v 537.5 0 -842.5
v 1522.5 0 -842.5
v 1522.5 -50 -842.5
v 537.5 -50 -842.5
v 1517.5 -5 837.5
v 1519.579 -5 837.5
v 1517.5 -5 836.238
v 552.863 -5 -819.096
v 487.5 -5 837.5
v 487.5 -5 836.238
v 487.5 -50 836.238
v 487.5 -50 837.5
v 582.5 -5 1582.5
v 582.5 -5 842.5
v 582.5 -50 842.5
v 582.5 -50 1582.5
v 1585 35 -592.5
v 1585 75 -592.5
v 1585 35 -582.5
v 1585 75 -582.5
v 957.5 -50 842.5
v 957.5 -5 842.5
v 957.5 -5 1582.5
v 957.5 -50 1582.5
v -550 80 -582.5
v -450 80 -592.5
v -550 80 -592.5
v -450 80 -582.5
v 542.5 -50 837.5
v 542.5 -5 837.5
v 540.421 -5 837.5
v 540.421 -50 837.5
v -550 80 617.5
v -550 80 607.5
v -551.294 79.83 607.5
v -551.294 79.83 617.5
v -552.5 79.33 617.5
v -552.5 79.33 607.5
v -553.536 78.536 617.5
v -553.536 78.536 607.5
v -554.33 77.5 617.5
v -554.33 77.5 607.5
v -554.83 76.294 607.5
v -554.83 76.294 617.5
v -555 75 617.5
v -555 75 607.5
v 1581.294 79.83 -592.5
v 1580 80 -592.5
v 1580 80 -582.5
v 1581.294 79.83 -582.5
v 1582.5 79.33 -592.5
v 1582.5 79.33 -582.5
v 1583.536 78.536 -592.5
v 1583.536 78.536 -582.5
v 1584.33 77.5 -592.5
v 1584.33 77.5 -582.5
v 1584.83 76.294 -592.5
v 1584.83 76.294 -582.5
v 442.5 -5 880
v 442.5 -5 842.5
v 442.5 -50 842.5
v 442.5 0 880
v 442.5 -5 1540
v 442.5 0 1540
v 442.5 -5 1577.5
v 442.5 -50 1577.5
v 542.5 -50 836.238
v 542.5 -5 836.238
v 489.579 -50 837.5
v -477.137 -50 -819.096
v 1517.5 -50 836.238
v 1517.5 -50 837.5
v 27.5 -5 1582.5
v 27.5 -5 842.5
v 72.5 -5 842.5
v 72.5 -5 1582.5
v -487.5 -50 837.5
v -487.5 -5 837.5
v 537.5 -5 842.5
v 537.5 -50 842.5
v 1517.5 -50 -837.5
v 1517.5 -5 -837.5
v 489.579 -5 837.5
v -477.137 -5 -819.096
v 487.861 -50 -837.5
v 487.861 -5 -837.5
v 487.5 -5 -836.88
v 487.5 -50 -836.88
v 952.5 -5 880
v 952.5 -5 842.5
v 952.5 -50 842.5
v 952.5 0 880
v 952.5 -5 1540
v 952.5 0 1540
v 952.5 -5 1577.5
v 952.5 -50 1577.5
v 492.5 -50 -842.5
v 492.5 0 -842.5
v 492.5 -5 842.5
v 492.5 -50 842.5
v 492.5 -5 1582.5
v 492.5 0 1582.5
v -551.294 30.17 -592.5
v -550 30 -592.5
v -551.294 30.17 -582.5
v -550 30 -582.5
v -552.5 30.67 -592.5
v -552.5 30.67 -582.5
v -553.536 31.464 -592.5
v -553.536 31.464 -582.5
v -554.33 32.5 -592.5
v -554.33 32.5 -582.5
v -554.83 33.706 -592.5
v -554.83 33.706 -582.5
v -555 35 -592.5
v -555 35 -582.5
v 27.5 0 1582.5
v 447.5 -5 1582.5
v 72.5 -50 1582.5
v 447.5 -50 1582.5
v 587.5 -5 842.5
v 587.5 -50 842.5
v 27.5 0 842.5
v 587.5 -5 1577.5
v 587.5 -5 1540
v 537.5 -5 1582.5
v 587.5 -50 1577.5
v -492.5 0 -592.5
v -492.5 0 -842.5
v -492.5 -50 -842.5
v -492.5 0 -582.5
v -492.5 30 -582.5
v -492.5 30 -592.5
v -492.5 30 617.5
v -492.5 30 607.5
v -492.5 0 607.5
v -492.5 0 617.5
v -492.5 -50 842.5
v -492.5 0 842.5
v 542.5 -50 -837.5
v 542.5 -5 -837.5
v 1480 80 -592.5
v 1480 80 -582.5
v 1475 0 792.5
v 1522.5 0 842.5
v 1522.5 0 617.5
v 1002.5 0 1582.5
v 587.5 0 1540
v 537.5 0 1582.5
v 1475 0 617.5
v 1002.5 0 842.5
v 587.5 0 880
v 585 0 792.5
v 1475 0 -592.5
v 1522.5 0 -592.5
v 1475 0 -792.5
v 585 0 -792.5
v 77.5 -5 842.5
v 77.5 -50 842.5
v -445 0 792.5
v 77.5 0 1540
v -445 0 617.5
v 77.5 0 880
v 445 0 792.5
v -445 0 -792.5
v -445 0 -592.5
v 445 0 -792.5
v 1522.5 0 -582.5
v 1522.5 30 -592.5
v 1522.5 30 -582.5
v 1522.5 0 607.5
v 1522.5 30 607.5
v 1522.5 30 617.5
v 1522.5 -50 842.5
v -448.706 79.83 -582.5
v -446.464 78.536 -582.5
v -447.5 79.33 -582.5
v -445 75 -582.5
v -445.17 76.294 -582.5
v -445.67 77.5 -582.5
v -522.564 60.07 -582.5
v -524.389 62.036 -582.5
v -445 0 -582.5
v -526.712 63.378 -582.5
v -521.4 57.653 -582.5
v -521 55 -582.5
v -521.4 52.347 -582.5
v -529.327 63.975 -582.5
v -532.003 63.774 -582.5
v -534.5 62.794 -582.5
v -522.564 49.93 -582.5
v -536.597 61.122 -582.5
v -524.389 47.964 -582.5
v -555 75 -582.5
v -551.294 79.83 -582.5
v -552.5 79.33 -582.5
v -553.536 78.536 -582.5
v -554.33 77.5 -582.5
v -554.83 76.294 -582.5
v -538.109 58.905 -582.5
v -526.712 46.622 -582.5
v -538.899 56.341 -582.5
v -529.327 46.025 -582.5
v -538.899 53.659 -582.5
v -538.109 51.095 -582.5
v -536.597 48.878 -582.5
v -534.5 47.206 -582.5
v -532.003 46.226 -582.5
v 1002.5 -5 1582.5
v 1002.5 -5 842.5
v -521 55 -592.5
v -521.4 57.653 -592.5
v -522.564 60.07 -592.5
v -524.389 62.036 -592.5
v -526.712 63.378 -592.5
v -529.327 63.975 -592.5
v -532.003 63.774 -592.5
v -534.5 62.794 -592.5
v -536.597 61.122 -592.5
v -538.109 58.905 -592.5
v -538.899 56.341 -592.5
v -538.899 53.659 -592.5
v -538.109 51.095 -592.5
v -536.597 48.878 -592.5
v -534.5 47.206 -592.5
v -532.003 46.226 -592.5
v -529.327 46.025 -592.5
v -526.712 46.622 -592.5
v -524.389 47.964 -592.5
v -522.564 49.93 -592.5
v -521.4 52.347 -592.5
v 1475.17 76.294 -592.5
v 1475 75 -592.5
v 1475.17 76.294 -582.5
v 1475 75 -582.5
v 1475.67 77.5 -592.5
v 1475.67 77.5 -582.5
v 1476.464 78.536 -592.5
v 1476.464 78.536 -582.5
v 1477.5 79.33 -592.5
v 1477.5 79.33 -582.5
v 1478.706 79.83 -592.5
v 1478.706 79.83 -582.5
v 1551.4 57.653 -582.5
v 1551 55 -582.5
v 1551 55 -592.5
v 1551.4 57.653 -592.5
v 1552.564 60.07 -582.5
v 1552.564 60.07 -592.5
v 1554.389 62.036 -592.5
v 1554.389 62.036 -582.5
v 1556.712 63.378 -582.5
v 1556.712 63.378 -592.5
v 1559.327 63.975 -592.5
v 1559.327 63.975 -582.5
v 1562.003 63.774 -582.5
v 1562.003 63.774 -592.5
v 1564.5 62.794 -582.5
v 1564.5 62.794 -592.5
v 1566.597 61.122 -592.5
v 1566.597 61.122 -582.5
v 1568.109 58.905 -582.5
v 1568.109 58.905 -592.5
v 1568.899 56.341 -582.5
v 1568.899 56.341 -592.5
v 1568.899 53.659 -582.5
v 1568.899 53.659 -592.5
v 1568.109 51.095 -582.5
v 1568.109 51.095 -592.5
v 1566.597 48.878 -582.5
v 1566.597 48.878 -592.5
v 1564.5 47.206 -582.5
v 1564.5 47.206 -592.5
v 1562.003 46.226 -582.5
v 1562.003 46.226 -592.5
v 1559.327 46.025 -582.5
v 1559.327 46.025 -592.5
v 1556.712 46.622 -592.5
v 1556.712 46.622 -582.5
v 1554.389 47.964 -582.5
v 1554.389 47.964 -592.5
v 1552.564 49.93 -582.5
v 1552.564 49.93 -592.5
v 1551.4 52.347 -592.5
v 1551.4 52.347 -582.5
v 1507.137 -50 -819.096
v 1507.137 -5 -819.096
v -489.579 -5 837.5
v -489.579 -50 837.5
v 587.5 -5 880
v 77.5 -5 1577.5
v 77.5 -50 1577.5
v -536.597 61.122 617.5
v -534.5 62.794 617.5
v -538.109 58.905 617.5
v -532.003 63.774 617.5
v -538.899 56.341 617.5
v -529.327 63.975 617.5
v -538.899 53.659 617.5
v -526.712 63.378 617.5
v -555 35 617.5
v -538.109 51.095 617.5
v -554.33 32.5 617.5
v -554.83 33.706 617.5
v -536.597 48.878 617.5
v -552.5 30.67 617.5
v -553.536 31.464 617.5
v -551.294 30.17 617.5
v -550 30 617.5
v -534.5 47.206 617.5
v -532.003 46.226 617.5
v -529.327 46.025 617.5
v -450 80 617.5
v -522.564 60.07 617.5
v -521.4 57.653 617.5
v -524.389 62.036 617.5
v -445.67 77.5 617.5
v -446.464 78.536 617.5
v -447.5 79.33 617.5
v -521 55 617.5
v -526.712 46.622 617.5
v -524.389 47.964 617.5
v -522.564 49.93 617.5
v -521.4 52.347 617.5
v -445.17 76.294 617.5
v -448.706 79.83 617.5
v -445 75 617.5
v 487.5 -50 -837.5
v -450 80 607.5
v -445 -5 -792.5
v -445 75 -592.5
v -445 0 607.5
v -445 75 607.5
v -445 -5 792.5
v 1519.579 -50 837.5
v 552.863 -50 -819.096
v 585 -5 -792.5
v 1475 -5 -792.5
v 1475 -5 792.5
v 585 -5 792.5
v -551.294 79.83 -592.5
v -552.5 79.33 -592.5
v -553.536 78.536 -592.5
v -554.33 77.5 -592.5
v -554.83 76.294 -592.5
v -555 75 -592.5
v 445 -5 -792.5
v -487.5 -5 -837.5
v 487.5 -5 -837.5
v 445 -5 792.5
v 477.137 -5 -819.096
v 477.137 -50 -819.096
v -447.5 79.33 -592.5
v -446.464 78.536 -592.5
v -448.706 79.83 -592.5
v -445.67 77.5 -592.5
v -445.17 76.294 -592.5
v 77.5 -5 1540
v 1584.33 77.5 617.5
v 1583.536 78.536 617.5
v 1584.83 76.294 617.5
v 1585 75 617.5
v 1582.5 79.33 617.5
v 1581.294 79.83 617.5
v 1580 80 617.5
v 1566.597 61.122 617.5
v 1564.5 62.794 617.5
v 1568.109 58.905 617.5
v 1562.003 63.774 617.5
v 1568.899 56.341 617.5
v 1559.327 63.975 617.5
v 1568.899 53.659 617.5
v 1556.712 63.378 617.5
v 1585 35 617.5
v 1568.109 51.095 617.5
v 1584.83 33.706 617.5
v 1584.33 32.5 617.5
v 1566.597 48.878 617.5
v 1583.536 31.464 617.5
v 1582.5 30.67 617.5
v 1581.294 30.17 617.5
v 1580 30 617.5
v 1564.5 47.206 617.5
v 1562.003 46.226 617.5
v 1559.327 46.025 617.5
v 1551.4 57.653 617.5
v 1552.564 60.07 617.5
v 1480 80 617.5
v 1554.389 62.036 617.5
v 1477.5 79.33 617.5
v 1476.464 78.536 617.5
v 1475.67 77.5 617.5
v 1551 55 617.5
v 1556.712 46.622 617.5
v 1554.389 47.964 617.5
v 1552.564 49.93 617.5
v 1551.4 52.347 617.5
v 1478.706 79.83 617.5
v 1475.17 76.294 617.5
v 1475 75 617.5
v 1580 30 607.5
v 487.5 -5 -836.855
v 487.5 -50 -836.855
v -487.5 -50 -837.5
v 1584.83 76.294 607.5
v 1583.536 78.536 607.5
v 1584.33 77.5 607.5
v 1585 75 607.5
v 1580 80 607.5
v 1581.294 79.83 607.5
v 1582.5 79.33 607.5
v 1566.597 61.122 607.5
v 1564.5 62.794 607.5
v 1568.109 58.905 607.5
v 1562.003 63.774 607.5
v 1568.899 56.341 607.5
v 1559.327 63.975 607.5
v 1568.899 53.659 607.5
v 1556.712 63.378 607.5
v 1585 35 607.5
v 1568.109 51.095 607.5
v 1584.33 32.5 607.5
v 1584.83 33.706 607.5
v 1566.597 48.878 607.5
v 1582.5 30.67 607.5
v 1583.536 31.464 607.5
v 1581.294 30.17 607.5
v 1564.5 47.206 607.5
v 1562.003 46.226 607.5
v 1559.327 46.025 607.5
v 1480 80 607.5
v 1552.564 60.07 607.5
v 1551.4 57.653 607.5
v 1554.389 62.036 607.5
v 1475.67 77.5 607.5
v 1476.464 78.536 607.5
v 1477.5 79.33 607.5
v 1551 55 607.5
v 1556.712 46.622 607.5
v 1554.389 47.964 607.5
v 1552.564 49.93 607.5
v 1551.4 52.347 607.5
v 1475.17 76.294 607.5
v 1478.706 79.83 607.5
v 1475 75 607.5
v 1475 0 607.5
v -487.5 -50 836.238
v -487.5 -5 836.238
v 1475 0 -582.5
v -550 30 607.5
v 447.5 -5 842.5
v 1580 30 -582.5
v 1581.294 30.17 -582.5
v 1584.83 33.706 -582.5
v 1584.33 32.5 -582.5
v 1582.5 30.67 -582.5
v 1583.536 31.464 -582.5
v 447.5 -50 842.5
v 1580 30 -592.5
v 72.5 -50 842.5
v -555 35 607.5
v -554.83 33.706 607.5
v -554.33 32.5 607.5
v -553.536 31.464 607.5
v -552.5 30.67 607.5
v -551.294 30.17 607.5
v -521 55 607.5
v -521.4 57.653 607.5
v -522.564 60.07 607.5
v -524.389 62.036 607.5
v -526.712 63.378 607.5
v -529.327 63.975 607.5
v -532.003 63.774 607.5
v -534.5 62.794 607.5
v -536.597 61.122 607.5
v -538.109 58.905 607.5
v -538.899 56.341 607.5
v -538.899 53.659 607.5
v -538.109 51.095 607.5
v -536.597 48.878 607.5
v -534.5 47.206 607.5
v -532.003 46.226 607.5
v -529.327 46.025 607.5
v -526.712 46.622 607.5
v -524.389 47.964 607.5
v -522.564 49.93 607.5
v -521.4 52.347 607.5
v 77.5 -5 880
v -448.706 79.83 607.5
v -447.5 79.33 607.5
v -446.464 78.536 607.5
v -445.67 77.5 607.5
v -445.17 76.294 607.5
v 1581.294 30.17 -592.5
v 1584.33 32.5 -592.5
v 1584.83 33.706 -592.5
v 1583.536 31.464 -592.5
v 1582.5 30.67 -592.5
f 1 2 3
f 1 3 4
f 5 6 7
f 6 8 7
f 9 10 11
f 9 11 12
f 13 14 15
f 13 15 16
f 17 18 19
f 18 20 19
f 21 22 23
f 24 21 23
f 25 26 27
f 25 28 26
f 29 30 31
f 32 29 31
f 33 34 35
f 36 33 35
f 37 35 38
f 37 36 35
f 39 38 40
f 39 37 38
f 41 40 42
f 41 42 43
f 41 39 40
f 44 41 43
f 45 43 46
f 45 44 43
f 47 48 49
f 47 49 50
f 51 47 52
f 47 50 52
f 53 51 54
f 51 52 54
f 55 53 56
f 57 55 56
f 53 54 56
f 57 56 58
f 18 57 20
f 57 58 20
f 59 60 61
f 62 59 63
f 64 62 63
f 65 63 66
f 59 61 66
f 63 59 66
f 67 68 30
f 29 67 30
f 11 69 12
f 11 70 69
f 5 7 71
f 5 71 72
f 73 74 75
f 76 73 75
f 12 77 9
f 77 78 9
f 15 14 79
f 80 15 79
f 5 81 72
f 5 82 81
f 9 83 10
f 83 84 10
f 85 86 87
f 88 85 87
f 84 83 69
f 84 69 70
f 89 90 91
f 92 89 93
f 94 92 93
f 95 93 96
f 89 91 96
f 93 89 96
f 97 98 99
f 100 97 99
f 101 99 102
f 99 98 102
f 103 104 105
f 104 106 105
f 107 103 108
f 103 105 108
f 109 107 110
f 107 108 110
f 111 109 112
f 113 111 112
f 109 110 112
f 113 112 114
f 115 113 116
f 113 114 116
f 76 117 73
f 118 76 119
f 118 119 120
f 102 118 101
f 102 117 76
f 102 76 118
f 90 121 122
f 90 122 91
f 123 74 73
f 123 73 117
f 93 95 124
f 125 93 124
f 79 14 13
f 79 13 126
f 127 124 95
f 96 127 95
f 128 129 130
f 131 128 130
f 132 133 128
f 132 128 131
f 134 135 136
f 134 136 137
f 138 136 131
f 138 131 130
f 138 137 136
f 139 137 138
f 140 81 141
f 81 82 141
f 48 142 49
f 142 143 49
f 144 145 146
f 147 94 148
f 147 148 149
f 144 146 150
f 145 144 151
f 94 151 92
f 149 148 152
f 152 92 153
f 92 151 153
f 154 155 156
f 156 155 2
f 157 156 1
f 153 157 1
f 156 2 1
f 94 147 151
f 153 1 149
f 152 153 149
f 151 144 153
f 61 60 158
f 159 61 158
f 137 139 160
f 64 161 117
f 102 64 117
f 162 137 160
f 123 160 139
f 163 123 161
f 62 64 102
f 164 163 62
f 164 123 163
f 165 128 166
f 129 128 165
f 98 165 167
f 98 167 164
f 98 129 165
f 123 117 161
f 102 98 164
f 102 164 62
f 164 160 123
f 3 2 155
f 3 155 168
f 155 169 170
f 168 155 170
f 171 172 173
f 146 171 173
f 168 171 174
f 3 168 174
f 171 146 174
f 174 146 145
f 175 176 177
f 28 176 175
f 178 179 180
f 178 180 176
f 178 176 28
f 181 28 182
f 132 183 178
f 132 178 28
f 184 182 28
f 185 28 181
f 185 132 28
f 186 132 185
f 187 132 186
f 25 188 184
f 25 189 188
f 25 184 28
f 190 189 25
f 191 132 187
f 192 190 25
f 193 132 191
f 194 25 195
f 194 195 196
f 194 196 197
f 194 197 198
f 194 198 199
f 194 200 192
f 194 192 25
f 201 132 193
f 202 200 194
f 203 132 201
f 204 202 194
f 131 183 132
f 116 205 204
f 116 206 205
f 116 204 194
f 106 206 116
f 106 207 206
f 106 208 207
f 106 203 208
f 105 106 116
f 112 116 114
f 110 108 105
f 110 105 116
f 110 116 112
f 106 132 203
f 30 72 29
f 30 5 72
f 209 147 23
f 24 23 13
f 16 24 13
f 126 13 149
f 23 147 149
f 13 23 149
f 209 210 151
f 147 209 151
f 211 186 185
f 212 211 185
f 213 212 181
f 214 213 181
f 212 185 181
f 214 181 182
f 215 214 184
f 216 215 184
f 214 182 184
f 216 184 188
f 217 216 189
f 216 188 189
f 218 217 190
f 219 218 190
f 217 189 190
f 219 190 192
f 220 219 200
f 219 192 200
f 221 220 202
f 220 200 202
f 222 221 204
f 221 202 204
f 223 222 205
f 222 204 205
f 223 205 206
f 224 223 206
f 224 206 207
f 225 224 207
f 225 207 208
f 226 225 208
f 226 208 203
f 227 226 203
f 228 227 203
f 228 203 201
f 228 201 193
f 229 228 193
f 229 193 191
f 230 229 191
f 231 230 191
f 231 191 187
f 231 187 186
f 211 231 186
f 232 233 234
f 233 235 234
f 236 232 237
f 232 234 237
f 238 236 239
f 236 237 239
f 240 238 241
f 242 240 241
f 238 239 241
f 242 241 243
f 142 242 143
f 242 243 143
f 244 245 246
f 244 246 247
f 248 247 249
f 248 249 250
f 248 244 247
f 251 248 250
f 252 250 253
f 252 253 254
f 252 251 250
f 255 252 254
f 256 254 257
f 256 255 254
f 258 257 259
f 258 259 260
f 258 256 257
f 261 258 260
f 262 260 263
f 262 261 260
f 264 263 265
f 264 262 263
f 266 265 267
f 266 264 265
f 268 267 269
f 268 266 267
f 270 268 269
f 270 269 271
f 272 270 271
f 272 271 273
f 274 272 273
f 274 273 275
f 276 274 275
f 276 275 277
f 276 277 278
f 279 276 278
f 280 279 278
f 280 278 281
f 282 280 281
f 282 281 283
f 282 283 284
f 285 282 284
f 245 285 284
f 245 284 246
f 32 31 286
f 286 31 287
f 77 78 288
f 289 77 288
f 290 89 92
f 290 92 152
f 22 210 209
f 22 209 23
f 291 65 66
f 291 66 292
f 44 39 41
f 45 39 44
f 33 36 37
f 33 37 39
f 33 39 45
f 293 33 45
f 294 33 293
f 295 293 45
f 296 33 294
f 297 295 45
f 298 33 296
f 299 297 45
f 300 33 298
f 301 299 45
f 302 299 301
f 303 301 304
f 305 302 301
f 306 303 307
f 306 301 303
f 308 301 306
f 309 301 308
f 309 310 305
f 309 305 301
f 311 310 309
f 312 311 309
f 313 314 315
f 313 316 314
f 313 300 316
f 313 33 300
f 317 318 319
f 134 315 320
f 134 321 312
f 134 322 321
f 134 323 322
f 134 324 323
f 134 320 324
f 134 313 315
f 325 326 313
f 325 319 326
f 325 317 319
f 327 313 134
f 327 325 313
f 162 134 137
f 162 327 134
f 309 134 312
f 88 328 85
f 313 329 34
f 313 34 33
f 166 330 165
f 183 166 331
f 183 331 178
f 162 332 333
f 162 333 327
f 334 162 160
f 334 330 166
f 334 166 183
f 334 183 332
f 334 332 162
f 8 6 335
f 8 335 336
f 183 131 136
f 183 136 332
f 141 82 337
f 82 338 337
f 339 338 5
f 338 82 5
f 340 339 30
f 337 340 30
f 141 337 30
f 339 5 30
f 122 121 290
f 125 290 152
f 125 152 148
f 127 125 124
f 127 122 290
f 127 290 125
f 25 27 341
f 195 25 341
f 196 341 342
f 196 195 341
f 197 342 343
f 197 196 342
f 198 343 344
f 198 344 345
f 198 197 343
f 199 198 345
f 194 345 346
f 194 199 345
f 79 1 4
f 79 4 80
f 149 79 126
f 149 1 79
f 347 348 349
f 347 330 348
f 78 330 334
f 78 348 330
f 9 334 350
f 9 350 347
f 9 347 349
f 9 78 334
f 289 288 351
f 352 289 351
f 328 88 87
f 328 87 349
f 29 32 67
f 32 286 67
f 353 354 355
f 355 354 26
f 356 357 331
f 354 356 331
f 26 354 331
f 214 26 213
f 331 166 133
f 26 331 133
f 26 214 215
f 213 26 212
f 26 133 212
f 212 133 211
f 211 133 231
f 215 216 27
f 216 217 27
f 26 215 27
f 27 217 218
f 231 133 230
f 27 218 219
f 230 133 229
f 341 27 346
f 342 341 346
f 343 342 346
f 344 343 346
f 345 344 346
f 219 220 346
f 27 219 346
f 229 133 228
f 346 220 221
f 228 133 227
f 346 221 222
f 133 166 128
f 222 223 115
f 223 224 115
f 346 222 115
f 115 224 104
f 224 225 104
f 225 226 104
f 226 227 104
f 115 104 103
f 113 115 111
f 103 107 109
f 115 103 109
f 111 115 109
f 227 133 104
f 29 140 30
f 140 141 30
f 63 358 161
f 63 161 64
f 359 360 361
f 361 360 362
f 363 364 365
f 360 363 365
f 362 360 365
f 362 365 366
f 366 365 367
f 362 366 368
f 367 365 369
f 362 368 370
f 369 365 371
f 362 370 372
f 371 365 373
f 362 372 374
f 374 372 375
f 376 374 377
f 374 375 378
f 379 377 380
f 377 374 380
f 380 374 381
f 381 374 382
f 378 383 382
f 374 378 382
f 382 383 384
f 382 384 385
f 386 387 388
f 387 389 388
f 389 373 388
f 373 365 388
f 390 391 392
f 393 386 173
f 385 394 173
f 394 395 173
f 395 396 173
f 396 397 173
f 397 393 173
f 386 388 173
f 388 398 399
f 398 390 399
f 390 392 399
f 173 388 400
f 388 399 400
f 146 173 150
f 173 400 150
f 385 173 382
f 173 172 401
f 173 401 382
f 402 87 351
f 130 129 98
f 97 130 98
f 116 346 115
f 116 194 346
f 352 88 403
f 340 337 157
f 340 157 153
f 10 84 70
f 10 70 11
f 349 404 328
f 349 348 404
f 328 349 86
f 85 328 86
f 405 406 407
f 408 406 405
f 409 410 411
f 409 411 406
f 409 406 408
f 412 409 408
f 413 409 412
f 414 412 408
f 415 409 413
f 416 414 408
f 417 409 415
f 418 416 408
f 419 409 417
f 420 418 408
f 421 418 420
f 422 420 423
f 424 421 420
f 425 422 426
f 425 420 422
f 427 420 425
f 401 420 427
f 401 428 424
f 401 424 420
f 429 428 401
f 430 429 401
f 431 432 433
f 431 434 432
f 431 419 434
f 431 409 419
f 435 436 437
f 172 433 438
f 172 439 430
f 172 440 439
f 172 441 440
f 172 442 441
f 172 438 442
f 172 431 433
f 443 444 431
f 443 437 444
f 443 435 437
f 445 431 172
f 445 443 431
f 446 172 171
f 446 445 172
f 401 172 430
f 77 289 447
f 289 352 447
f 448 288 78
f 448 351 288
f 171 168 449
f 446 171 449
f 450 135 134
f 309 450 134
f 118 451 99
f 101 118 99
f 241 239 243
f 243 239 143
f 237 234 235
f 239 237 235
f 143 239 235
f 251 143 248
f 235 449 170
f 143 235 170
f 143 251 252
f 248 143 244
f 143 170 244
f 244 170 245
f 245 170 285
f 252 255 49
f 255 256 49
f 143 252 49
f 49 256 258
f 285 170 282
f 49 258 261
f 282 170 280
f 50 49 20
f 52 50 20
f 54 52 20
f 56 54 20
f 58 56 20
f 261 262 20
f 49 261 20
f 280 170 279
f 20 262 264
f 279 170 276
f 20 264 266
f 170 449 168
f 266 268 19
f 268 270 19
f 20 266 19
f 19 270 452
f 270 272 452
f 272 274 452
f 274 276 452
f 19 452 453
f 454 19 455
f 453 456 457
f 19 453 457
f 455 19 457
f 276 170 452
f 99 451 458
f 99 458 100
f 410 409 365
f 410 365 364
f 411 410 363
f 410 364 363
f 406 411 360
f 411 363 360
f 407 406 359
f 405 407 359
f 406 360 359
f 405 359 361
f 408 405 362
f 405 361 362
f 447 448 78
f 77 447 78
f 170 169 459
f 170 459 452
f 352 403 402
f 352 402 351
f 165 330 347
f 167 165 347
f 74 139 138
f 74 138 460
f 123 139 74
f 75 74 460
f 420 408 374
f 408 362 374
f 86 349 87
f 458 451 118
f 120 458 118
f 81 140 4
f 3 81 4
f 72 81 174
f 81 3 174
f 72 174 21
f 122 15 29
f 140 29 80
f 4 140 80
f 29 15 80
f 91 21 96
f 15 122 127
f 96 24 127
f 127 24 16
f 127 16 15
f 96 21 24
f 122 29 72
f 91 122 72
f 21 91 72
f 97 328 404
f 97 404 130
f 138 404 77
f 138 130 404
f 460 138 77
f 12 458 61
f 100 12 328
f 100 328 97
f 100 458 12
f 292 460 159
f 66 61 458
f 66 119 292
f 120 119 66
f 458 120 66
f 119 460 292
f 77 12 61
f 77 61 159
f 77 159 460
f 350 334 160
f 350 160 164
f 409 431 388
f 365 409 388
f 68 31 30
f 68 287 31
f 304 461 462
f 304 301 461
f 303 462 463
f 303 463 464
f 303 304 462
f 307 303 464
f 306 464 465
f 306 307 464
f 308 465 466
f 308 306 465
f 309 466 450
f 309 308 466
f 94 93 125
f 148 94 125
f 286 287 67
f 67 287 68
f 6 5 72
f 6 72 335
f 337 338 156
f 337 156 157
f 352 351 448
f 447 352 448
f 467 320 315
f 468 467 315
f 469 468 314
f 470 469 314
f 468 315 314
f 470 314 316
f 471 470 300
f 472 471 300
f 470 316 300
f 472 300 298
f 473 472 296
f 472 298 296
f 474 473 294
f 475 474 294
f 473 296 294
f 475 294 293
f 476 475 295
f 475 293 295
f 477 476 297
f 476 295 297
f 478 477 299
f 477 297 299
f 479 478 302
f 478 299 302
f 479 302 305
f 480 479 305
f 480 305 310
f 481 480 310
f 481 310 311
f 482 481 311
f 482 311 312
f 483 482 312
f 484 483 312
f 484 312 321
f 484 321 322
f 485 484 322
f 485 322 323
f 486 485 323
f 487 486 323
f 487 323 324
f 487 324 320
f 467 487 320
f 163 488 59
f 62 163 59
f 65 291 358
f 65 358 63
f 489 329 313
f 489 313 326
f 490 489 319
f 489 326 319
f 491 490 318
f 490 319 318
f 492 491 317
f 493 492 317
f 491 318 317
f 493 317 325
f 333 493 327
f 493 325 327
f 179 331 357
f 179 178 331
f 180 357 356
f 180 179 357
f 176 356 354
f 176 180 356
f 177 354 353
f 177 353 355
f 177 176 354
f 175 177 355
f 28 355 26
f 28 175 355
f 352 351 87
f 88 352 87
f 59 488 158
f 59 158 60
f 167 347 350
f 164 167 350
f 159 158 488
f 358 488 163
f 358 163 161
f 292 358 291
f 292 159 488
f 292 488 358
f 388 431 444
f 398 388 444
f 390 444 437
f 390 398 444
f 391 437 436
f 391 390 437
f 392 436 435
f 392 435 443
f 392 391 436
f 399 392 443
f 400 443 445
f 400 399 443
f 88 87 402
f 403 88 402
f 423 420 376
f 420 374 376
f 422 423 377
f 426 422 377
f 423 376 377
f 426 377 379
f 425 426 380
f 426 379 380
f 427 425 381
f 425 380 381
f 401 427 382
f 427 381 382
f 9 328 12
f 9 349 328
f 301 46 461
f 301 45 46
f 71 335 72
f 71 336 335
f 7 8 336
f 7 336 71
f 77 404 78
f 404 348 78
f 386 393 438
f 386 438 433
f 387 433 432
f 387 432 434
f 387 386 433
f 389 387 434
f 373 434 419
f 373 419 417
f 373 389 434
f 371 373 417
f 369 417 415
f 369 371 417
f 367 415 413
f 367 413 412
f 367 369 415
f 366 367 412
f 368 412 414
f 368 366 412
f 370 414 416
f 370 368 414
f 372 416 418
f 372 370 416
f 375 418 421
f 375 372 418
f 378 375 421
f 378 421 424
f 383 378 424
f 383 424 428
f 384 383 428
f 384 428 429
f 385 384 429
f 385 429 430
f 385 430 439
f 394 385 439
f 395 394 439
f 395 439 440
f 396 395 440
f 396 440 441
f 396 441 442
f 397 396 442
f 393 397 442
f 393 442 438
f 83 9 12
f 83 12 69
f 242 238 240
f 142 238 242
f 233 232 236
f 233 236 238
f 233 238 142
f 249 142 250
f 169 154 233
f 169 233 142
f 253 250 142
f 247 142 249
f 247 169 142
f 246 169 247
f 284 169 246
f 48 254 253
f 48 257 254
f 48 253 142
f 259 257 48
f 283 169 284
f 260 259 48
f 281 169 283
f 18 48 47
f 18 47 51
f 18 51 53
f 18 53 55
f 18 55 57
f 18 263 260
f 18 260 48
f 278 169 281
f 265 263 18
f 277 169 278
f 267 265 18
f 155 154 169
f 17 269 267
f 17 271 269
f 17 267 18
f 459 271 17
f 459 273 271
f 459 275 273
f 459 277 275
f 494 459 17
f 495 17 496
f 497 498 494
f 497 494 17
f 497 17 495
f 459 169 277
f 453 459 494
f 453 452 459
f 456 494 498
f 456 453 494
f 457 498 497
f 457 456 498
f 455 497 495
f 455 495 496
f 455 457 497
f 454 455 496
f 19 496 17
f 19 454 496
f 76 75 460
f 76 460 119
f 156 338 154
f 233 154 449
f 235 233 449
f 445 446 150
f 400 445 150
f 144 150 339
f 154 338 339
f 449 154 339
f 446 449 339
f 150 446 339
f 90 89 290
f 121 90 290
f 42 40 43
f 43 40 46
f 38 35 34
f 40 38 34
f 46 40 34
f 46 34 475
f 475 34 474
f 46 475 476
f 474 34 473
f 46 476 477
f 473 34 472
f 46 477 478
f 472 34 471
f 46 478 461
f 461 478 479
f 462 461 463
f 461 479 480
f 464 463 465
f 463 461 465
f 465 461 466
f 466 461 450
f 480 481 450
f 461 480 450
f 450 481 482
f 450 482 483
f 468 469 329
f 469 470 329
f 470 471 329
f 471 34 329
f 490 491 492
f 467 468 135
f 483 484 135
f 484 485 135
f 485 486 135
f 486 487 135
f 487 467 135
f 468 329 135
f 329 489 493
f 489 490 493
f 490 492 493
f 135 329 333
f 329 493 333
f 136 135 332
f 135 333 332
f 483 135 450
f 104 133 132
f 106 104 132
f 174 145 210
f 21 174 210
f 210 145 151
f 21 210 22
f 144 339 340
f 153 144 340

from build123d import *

# Parameters (mm, degrees)
F0_W      = 985
F0_H      = 1685
F1_DEPTH  = 50
F2_T      = -5
F3_W      = 890
F3_H      = 1585
F4_DEPTH  = 50.001
F5_W      = 375
F5_H      = 740
F6_DEPTH  = 50
F7_T      = -5
F8_W      = 365
F8_H      = 660
F9_DEPTH  = 5.001
F10_W     = 45
F10_H     = 5
F11_DEPTH = 740
F13_DEPTH = 45
F16_W     = 47.5
F16_H     = 10
F17_DEPTH = 80
F18_W     = 50
F18_H     = 10
F19_DEPTH = 62.5
F20_R     = 9
F21_DEPTH = 1460.001
F22_R     = 5


# Not quite as in the source:
# - a shell that OpenCascade refuses in one call is made with other operations: the cavity is built on its own and cut out


with BuildPart() as f1:
    # F0 (on Front) → F1 (new body)
    with BuildSketch(Plane.XZ):
        Rectangle(F0_W, F0_H)
    extrude(amount=F1_DEPTH)

    # F2
    f2_openings = [f1.faces().sort_by_distance(p)[0] for p in [
        (0, -50, 0),
    ]]
    offset(amount=F2_T, openings=f2_openings)

    # F3 (on face) → F4 (cut, through all)
    with BuildSketch(Plane.XZ.offset(50)):
        Rectangle(F3_W, F3_H)
    extrude(amount=-F4_DEPTH, mode=Mode.SUBTRACT)

    # F5 (on Front) → F6 (join)
    with BuildSketch(Plane.XZ):
        with Locations((260, 1212.5)):
            Rectangle(F5_W, F5_H)
    extrude(amount=F6_DEPTH)

    # F7: a shell. OpenCascade refuses it in one call, so the cavity is built on its own and cut out:
    # the body offset inwards by the wall thickness, plus a prism from it out through each open face.
    f7_core = offset(f1.part, amount=F7_T, kind=Kind.INTERSECTION, mode=Mode.PRIVATE)
    f7_exits = [f7_core.faces().sort_by_distance(p)[0] for p in [
        (260, -45, 1210),
    ]]
    add(f7_core, mode=Mode.SUBTRACT)
    extrude(f7_exits, amount=-F7_T, mode=Mode.SUBTRACT)

    # F8 (on face) → F9 (cut, through all)
    with BuildSketch(Plane.XZ.offset(5)):
        with Locations((260, 1210)):
            Rectangle(F8_W, F8_H)
    extrude(amount=-F9_DEPTH, mode=Mode.SUBTRACT)

    # F10 (on face) → F11 (join)
    with BuildSketch(Plane.XY.offset(842.5)):
        with Locations((50, -2.5)):
            Rectangle(F10_W, F10_H)
        with Locations((470, -2.5)):
            Rectangle(F10_W, F10_H)
    extrude(amount=F11_DEPTH)

    # F16 (on face) → F17 (join)
    with BuildSketch(Plane(origin=(0, 0, 0), x_dir=(-1, 0, 0), z_dir=(0, 1, 0))):
        with Locations((468.75, -587.5)):
            Rectangle(F16_W, F16_H)
        with Locations((468.75, 612.5)):
            Rectangle(F16_W, F16_H)
    extrude(amount=F17_DEPTH)

    # F18 (on face) → F19 (join)
    with BuildSketch(Plane(origin=(-492.5, 0, 0), x_dir=(0, -1, 0), z_dir=(-1, 0, 0))):
        with Locations((-55, 612.5)):
            Rectangle(F18_W, F18_H)
        with Locations((-55, -587.5)):
            Rectangle(F18_W, F18_H)
    extrude(amount=F19_DEPTH)

    # F20 (on face) → F21 (cut, through all)
    with BuildSketch(Plane.XY.offset(617.5)):
        with Locations((-530, 55)):
            Circle(F20_R)
    extrude(amount=-F21_DEPTH, mode=Mode.SUBTRACT)

    # F22
    f22_edges = [f1.edges().sort_by_distance(p)[0] for p in [
        (-445, 80, 612.5),
        (-555, 80, 612.5),
        (-555, 30, 612.5),
        (-555, 30, -587.5),
        (-555, 80, -587.5),
        (-445, 80, -587.5),
    ]]
    fillet(f22_edges, radius=F22_R)


with BuildPart() as f13:
    # F12 (on face) → F13 (new body)
    with BuildSketch(Plane.XZ.offset(5)):
        Polygon((487.8614675759, -837.5), (487.5, -836.87971525), (487.5, -837.5), align=None)
    extrude(amount=F13_DEPTH)


with BuildPart() as f13b:
    # F12 (on face) → F13, piece 2 (new body)
    with BuildSketch(Plane.XZ.offset(5)):
        Polygon((487.5, -836.8550058622), (477.1365219459, -819.0958037114), (487.5, -836.87971525), align=None)
    extrude(amount=F13_DEPTH)


with BuildPart() as f13c:
    # F12 (on face) → F13, piece 3 (new body)
    with BuildSketch(Plane.XZ.offset(5)):
        Polygon((477.1365219459, -819.0958037114), (-487.5, 836.2375200634), (-487.5, 837.5), (-489.5788806122, 837.5), align=None)
    extrude(amount=F13_DEPTH)


with BuildPart() as f14_1:
    # F14: instance of F13c
    add(f13c.part.mirror(Plane.YZ))


with BuildPart() as f23_1:
    # F23: instance of F1
    add(f1.part.mirror(Plane.YZ.offset(515)))


with BuildPart() as f23_2:
    # F23: instance of F13c
    add(f13c.part.mirror(Plane.YZ.offset(515)))


with BuildPart() as f23_3:
    # F23: instance of F14_1
    add(f14_1.part.mirror(Plane.YZ.offset(515)))


solid = Compound([f1.part, f13.part, f13b.part, f13c.part, f14_1.part, f23_1.part, f23_2.part, f23_3.part])
